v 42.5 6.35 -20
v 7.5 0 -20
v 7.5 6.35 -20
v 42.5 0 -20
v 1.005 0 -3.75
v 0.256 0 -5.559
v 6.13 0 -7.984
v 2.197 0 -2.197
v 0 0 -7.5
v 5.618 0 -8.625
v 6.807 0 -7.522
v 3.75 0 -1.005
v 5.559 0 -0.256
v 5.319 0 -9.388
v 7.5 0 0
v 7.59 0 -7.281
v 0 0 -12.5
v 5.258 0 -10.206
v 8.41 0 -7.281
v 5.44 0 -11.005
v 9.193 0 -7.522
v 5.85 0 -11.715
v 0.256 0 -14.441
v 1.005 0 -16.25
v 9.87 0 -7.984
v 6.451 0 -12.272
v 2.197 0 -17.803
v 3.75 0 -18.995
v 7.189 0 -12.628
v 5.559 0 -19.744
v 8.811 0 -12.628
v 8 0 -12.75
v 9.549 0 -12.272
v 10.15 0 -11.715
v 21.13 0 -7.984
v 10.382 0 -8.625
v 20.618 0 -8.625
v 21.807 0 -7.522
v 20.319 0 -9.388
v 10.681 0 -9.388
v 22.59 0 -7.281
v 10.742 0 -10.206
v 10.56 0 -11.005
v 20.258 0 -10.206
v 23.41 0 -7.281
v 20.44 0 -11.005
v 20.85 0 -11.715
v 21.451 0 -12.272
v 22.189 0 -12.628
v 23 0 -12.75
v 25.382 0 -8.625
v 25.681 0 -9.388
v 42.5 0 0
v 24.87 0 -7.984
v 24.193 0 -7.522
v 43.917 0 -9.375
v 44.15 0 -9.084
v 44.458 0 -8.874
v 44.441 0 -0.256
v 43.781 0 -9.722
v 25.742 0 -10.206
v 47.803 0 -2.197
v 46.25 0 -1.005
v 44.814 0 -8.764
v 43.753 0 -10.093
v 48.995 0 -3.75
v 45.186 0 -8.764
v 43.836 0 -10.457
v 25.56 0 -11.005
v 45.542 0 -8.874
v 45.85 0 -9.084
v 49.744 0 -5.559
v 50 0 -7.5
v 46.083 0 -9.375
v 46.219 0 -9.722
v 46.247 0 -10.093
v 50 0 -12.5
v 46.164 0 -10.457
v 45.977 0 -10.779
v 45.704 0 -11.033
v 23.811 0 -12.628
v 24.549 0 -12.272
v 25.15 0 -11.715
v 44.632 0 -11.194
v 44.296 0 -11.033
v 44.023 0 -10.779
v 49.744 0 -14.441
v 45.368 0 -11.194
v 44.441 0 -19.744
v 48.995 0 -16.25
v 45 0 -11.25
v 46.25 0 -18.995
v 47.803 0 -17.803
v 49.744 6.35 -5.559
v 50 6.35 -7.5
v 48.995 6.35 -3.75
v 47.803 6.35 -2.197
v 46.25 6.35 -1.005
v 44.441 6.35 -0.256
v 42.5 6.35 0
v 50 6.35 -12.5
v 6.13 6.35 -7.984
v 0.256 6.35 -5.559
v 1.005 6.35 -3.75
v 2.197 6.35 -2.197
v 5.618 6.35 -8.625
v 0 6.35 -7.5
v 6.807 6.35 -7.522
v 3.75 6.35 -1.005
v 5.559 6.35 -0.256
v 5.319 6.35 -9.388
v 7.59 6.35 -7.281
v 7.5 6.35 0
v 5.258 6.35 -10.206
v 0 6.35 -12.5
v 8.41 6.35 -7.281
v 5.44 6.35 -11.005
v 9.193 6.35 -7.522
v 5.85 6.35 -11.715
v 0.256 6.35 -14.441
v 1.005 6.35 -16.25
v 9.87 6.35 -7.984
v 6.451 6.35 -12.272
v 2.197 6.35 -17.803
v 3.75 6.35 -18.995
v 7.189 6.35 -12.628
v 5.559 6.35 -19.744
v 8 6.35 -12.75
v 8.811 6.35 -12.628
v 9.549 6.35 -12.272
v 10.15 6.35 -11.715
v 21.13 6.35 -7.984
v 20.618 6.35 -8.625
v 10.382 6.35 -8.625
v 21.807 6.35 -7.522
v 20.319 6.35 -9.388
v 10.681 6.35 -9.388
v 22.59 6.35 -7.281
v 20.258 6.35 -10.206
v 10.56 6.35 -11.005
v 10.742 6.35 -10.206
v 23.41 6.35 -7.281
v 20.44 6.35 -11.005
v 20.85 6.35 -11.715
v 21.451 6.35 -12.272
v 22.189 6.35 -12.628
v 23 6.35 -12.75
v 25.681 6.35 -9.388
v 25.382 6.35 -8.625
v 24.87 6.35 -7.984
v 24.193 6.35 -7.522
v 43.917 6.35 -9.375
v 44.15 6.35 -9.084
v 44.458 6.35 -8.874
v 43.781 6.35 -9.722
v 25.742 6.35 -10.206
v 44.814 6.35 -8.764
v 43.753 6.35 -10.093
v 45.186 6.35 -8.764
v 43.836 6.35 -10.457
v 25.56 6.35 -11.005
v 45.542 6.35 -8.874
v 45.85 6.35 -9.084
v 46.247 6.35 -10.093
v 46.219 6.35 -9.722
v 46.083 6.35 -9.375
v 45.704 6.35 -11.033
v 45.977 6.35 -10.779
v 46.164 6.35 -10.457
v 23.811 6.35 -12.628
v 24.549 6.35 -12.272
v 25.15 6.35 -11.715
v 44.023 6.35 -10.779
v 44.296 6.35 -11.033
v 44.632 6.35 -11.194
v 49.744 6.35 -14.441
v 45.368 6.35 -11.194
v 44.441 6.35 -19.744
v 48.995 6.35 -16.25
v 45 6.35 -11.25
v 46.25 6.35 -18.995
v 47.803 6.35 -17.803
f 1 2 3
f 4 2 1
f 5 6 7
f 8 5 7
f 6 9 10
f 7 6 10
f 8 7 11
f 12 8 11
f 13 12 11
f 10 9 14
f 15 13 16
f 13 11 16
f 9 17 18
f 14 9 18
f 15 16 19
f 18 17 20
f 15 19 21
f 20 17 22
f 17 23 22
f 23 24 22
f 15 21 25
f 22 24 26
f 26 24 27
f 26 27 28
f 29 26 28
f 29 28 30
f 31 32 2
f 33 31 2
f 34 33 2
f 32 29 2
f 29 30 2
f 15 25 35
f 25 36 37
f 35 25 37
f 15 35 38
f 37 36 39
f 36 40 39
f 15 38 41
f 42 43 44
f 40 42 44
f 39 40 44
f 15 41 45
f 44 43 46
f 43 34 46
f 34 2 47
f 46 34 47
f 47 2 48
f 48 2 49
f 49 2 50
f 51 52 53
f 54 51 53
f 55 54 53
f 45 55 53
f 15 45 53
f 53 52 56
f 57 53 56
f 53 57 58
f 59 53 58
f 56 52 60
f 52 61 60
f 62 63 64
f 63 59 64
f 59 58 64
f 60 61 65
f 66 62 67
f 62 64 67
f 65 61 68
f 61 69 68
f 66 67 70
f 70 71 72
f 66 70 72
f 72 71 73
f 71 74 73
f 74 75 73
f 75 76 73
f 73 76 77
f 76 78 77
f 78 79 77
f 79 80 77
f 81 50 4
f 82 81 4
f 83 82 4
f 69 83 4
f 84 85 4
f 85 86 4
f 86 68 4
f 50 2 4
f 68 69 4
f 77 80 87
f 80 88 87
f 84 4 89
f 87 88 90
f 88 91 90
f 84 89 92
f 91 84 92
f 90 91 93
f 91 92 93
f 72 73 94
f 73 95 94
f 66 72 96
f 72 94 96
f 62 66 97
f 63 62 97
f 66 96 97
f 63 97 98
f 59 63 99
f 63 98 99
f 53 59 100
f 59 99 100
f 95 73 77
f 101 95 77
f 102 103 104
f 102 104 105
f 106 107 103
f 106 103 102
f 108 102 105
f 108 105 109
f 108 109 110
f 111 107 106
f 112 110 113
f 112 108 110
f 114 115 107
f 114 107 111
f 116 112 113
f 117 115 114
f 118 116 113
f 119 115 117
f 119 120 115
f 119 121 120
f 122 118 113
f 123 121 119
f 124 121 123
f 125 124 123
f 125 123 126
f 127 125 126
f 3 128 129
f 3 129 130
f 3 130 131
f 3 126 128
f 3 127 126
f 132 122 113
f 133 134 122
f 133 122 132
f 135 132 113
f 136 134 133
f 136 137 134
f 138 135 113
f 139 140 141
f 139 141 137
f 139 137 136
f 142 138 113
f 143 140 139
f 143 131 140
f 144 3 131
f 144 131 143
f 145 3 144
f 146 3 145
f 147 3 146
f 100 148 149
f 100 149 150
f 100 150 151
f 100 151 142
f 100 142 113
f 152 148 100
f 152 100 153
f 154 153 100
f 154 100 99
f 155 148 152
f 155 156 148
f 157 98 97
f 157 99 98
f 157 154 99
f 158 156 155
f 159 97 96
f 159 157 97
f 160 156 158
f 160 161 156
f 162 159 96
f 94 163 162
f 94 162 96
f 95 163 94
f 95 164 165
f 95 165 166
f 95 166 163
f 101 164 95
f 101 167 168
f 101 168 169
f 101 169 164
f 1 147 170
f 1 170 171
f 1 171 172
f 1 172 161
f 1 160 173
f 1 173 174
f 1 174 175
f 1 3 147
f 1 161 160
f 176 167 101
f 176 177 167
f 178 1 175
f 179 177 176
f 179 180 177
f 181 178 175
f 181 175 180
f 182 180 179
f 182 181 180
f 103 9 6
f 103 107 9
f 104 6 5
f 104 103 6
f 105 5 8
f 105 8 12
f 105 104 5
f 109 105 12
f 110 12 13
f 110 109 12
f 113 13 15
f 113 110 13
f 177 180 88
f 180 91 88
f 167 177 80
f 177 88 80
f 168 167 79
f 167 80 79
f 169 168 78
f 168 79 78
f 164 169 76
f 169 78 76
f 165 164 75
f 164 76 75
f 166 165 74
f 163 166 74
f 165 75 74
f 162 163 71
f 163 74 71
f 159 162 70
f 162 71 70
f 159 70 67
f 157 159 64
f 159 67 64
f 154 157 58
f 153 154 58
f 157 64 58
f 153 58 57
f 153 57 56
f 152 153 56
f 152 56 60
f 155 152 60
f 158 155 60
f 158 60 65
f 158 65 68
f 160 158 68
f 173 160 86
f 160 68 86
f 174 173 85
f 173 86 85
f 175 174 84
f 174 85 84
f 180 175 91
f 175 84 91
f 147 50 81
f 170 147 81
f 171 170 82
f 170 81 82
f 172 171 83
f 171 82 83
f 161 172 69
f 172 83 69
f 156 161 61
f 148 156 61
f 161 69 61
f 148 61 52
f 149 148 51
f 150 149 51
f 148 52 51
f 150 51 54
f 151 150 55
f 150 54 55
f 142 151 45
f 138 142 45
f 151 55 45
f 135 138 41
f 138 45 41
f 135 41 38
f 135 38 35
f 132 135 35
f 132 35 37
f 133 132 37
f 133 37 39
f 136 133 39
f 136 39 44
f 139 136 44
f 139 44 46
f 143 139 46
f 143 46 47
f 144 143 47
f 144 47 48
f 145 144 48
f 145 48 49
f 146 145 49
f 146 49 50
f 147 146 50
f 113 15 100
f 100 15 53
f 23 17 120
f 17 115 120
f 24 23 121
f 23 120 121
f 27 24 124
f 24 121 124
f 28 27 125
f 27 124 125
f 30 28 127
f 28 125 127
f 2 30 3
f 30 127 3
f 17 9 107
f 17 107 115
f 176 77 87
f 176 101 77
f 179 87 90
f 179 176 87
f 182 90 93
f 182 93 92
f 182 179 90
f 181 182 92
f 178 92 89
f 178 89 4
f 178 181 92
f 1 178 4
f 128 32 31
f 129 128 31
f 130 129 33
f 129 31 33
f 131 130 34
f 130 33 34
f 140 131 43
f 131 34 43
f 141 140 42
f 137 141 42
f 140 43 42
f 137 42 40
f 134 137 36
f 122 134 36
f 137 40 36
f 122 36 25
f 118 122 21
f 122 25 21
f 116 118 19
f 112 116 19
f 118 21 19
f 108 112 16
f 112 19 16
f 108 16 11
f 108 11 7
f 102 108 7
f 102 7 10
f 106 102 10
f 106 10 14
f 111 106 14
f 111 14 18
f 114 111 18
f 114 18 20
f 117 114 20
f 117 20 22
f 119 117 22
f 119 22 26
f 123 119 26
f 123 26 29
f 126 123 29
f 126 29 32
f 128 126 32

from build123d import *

# Parameters (mm, degrees)
SKETCH2_W                       = 50
SKETCH2_H                       = 20
BOSS_EXTRUDE1_DEPTH             = 6.35
M5_CLEARANCE_HOLE1_D            = 5.5
TAP_DRILL_FOR_M3X0_5_TAP1_D     = 2.5
TAP_DRILL_FOR_M3X0_5_TAP1_DEPTH = 6.35
TAP_DRILL_FOR_M3X0_5_TAP1_TIP   = 0.751075774
FILLET1_R                       = 7.5


with BuildPart() as part:
    # Sketch2 → Boss-Extrude1 (new body)
    with BuildSketch(Plane(origin=(0, 0, 0), x_dir=(1, 0, 0), z_dir=(0, 1, 0))):
        with Locations((25, 10)):
            Rectangle(SKETCH2_W, SKETCH2_H)
    extrude(amount=BOSS_EXTRUDE1_DEPTH)

    # M5 Clearance Hole1 (through all)
    with Locations(Plane(origin=(8, 6.35, -10), x_dir=(0, 0, 1), z_dir=(0, 1, 0))):
        with Locations((0, 0), (0, 15)):
            Hole(M5_CLEARANCE_HOLE1_D / 2)

    # Tap Drill for M3x0.5 Tap1
    with Locations(Plane(origin=(45, 6.35, -10), x_dir=(0, 0, 1), z_dir=(0, 1, 0))):
        with Locations((0, 0)):
            Hole(TAP_DRILL_FOR_M3X0_5_TAP1_D / 2, depth=TAP_DRILL_FOR_M3X0_5_TAP1_DEPTH)
            with Locations((0, 0, -(TAP_DRILL_FOR_M3X0_5_TAP1_DEPTH + TAP_DRILL_FOR_M3X0_5_TAP1_TIP / 2))):  # 118° drill point
                Cone(0, TAP_DRILL_FOR_M3X0_5_TAP1_D / 2, TAP_DRILL_FOR_M3X0_5_TAP1_TIP, mode=Mode.SUBTRACT)

    # Fillet1
    fillet1_edges = [part.edges().sort_by_distance(p)[0] for p in [
        (0, 3.175, -20),
        (50, 3.175, -20),
        (50, 3.175, 0),
        (0, 3.175, 0),
    ]]
    fillet(fillet1_edges, radius=FILLET1_R)


solid = part.part
